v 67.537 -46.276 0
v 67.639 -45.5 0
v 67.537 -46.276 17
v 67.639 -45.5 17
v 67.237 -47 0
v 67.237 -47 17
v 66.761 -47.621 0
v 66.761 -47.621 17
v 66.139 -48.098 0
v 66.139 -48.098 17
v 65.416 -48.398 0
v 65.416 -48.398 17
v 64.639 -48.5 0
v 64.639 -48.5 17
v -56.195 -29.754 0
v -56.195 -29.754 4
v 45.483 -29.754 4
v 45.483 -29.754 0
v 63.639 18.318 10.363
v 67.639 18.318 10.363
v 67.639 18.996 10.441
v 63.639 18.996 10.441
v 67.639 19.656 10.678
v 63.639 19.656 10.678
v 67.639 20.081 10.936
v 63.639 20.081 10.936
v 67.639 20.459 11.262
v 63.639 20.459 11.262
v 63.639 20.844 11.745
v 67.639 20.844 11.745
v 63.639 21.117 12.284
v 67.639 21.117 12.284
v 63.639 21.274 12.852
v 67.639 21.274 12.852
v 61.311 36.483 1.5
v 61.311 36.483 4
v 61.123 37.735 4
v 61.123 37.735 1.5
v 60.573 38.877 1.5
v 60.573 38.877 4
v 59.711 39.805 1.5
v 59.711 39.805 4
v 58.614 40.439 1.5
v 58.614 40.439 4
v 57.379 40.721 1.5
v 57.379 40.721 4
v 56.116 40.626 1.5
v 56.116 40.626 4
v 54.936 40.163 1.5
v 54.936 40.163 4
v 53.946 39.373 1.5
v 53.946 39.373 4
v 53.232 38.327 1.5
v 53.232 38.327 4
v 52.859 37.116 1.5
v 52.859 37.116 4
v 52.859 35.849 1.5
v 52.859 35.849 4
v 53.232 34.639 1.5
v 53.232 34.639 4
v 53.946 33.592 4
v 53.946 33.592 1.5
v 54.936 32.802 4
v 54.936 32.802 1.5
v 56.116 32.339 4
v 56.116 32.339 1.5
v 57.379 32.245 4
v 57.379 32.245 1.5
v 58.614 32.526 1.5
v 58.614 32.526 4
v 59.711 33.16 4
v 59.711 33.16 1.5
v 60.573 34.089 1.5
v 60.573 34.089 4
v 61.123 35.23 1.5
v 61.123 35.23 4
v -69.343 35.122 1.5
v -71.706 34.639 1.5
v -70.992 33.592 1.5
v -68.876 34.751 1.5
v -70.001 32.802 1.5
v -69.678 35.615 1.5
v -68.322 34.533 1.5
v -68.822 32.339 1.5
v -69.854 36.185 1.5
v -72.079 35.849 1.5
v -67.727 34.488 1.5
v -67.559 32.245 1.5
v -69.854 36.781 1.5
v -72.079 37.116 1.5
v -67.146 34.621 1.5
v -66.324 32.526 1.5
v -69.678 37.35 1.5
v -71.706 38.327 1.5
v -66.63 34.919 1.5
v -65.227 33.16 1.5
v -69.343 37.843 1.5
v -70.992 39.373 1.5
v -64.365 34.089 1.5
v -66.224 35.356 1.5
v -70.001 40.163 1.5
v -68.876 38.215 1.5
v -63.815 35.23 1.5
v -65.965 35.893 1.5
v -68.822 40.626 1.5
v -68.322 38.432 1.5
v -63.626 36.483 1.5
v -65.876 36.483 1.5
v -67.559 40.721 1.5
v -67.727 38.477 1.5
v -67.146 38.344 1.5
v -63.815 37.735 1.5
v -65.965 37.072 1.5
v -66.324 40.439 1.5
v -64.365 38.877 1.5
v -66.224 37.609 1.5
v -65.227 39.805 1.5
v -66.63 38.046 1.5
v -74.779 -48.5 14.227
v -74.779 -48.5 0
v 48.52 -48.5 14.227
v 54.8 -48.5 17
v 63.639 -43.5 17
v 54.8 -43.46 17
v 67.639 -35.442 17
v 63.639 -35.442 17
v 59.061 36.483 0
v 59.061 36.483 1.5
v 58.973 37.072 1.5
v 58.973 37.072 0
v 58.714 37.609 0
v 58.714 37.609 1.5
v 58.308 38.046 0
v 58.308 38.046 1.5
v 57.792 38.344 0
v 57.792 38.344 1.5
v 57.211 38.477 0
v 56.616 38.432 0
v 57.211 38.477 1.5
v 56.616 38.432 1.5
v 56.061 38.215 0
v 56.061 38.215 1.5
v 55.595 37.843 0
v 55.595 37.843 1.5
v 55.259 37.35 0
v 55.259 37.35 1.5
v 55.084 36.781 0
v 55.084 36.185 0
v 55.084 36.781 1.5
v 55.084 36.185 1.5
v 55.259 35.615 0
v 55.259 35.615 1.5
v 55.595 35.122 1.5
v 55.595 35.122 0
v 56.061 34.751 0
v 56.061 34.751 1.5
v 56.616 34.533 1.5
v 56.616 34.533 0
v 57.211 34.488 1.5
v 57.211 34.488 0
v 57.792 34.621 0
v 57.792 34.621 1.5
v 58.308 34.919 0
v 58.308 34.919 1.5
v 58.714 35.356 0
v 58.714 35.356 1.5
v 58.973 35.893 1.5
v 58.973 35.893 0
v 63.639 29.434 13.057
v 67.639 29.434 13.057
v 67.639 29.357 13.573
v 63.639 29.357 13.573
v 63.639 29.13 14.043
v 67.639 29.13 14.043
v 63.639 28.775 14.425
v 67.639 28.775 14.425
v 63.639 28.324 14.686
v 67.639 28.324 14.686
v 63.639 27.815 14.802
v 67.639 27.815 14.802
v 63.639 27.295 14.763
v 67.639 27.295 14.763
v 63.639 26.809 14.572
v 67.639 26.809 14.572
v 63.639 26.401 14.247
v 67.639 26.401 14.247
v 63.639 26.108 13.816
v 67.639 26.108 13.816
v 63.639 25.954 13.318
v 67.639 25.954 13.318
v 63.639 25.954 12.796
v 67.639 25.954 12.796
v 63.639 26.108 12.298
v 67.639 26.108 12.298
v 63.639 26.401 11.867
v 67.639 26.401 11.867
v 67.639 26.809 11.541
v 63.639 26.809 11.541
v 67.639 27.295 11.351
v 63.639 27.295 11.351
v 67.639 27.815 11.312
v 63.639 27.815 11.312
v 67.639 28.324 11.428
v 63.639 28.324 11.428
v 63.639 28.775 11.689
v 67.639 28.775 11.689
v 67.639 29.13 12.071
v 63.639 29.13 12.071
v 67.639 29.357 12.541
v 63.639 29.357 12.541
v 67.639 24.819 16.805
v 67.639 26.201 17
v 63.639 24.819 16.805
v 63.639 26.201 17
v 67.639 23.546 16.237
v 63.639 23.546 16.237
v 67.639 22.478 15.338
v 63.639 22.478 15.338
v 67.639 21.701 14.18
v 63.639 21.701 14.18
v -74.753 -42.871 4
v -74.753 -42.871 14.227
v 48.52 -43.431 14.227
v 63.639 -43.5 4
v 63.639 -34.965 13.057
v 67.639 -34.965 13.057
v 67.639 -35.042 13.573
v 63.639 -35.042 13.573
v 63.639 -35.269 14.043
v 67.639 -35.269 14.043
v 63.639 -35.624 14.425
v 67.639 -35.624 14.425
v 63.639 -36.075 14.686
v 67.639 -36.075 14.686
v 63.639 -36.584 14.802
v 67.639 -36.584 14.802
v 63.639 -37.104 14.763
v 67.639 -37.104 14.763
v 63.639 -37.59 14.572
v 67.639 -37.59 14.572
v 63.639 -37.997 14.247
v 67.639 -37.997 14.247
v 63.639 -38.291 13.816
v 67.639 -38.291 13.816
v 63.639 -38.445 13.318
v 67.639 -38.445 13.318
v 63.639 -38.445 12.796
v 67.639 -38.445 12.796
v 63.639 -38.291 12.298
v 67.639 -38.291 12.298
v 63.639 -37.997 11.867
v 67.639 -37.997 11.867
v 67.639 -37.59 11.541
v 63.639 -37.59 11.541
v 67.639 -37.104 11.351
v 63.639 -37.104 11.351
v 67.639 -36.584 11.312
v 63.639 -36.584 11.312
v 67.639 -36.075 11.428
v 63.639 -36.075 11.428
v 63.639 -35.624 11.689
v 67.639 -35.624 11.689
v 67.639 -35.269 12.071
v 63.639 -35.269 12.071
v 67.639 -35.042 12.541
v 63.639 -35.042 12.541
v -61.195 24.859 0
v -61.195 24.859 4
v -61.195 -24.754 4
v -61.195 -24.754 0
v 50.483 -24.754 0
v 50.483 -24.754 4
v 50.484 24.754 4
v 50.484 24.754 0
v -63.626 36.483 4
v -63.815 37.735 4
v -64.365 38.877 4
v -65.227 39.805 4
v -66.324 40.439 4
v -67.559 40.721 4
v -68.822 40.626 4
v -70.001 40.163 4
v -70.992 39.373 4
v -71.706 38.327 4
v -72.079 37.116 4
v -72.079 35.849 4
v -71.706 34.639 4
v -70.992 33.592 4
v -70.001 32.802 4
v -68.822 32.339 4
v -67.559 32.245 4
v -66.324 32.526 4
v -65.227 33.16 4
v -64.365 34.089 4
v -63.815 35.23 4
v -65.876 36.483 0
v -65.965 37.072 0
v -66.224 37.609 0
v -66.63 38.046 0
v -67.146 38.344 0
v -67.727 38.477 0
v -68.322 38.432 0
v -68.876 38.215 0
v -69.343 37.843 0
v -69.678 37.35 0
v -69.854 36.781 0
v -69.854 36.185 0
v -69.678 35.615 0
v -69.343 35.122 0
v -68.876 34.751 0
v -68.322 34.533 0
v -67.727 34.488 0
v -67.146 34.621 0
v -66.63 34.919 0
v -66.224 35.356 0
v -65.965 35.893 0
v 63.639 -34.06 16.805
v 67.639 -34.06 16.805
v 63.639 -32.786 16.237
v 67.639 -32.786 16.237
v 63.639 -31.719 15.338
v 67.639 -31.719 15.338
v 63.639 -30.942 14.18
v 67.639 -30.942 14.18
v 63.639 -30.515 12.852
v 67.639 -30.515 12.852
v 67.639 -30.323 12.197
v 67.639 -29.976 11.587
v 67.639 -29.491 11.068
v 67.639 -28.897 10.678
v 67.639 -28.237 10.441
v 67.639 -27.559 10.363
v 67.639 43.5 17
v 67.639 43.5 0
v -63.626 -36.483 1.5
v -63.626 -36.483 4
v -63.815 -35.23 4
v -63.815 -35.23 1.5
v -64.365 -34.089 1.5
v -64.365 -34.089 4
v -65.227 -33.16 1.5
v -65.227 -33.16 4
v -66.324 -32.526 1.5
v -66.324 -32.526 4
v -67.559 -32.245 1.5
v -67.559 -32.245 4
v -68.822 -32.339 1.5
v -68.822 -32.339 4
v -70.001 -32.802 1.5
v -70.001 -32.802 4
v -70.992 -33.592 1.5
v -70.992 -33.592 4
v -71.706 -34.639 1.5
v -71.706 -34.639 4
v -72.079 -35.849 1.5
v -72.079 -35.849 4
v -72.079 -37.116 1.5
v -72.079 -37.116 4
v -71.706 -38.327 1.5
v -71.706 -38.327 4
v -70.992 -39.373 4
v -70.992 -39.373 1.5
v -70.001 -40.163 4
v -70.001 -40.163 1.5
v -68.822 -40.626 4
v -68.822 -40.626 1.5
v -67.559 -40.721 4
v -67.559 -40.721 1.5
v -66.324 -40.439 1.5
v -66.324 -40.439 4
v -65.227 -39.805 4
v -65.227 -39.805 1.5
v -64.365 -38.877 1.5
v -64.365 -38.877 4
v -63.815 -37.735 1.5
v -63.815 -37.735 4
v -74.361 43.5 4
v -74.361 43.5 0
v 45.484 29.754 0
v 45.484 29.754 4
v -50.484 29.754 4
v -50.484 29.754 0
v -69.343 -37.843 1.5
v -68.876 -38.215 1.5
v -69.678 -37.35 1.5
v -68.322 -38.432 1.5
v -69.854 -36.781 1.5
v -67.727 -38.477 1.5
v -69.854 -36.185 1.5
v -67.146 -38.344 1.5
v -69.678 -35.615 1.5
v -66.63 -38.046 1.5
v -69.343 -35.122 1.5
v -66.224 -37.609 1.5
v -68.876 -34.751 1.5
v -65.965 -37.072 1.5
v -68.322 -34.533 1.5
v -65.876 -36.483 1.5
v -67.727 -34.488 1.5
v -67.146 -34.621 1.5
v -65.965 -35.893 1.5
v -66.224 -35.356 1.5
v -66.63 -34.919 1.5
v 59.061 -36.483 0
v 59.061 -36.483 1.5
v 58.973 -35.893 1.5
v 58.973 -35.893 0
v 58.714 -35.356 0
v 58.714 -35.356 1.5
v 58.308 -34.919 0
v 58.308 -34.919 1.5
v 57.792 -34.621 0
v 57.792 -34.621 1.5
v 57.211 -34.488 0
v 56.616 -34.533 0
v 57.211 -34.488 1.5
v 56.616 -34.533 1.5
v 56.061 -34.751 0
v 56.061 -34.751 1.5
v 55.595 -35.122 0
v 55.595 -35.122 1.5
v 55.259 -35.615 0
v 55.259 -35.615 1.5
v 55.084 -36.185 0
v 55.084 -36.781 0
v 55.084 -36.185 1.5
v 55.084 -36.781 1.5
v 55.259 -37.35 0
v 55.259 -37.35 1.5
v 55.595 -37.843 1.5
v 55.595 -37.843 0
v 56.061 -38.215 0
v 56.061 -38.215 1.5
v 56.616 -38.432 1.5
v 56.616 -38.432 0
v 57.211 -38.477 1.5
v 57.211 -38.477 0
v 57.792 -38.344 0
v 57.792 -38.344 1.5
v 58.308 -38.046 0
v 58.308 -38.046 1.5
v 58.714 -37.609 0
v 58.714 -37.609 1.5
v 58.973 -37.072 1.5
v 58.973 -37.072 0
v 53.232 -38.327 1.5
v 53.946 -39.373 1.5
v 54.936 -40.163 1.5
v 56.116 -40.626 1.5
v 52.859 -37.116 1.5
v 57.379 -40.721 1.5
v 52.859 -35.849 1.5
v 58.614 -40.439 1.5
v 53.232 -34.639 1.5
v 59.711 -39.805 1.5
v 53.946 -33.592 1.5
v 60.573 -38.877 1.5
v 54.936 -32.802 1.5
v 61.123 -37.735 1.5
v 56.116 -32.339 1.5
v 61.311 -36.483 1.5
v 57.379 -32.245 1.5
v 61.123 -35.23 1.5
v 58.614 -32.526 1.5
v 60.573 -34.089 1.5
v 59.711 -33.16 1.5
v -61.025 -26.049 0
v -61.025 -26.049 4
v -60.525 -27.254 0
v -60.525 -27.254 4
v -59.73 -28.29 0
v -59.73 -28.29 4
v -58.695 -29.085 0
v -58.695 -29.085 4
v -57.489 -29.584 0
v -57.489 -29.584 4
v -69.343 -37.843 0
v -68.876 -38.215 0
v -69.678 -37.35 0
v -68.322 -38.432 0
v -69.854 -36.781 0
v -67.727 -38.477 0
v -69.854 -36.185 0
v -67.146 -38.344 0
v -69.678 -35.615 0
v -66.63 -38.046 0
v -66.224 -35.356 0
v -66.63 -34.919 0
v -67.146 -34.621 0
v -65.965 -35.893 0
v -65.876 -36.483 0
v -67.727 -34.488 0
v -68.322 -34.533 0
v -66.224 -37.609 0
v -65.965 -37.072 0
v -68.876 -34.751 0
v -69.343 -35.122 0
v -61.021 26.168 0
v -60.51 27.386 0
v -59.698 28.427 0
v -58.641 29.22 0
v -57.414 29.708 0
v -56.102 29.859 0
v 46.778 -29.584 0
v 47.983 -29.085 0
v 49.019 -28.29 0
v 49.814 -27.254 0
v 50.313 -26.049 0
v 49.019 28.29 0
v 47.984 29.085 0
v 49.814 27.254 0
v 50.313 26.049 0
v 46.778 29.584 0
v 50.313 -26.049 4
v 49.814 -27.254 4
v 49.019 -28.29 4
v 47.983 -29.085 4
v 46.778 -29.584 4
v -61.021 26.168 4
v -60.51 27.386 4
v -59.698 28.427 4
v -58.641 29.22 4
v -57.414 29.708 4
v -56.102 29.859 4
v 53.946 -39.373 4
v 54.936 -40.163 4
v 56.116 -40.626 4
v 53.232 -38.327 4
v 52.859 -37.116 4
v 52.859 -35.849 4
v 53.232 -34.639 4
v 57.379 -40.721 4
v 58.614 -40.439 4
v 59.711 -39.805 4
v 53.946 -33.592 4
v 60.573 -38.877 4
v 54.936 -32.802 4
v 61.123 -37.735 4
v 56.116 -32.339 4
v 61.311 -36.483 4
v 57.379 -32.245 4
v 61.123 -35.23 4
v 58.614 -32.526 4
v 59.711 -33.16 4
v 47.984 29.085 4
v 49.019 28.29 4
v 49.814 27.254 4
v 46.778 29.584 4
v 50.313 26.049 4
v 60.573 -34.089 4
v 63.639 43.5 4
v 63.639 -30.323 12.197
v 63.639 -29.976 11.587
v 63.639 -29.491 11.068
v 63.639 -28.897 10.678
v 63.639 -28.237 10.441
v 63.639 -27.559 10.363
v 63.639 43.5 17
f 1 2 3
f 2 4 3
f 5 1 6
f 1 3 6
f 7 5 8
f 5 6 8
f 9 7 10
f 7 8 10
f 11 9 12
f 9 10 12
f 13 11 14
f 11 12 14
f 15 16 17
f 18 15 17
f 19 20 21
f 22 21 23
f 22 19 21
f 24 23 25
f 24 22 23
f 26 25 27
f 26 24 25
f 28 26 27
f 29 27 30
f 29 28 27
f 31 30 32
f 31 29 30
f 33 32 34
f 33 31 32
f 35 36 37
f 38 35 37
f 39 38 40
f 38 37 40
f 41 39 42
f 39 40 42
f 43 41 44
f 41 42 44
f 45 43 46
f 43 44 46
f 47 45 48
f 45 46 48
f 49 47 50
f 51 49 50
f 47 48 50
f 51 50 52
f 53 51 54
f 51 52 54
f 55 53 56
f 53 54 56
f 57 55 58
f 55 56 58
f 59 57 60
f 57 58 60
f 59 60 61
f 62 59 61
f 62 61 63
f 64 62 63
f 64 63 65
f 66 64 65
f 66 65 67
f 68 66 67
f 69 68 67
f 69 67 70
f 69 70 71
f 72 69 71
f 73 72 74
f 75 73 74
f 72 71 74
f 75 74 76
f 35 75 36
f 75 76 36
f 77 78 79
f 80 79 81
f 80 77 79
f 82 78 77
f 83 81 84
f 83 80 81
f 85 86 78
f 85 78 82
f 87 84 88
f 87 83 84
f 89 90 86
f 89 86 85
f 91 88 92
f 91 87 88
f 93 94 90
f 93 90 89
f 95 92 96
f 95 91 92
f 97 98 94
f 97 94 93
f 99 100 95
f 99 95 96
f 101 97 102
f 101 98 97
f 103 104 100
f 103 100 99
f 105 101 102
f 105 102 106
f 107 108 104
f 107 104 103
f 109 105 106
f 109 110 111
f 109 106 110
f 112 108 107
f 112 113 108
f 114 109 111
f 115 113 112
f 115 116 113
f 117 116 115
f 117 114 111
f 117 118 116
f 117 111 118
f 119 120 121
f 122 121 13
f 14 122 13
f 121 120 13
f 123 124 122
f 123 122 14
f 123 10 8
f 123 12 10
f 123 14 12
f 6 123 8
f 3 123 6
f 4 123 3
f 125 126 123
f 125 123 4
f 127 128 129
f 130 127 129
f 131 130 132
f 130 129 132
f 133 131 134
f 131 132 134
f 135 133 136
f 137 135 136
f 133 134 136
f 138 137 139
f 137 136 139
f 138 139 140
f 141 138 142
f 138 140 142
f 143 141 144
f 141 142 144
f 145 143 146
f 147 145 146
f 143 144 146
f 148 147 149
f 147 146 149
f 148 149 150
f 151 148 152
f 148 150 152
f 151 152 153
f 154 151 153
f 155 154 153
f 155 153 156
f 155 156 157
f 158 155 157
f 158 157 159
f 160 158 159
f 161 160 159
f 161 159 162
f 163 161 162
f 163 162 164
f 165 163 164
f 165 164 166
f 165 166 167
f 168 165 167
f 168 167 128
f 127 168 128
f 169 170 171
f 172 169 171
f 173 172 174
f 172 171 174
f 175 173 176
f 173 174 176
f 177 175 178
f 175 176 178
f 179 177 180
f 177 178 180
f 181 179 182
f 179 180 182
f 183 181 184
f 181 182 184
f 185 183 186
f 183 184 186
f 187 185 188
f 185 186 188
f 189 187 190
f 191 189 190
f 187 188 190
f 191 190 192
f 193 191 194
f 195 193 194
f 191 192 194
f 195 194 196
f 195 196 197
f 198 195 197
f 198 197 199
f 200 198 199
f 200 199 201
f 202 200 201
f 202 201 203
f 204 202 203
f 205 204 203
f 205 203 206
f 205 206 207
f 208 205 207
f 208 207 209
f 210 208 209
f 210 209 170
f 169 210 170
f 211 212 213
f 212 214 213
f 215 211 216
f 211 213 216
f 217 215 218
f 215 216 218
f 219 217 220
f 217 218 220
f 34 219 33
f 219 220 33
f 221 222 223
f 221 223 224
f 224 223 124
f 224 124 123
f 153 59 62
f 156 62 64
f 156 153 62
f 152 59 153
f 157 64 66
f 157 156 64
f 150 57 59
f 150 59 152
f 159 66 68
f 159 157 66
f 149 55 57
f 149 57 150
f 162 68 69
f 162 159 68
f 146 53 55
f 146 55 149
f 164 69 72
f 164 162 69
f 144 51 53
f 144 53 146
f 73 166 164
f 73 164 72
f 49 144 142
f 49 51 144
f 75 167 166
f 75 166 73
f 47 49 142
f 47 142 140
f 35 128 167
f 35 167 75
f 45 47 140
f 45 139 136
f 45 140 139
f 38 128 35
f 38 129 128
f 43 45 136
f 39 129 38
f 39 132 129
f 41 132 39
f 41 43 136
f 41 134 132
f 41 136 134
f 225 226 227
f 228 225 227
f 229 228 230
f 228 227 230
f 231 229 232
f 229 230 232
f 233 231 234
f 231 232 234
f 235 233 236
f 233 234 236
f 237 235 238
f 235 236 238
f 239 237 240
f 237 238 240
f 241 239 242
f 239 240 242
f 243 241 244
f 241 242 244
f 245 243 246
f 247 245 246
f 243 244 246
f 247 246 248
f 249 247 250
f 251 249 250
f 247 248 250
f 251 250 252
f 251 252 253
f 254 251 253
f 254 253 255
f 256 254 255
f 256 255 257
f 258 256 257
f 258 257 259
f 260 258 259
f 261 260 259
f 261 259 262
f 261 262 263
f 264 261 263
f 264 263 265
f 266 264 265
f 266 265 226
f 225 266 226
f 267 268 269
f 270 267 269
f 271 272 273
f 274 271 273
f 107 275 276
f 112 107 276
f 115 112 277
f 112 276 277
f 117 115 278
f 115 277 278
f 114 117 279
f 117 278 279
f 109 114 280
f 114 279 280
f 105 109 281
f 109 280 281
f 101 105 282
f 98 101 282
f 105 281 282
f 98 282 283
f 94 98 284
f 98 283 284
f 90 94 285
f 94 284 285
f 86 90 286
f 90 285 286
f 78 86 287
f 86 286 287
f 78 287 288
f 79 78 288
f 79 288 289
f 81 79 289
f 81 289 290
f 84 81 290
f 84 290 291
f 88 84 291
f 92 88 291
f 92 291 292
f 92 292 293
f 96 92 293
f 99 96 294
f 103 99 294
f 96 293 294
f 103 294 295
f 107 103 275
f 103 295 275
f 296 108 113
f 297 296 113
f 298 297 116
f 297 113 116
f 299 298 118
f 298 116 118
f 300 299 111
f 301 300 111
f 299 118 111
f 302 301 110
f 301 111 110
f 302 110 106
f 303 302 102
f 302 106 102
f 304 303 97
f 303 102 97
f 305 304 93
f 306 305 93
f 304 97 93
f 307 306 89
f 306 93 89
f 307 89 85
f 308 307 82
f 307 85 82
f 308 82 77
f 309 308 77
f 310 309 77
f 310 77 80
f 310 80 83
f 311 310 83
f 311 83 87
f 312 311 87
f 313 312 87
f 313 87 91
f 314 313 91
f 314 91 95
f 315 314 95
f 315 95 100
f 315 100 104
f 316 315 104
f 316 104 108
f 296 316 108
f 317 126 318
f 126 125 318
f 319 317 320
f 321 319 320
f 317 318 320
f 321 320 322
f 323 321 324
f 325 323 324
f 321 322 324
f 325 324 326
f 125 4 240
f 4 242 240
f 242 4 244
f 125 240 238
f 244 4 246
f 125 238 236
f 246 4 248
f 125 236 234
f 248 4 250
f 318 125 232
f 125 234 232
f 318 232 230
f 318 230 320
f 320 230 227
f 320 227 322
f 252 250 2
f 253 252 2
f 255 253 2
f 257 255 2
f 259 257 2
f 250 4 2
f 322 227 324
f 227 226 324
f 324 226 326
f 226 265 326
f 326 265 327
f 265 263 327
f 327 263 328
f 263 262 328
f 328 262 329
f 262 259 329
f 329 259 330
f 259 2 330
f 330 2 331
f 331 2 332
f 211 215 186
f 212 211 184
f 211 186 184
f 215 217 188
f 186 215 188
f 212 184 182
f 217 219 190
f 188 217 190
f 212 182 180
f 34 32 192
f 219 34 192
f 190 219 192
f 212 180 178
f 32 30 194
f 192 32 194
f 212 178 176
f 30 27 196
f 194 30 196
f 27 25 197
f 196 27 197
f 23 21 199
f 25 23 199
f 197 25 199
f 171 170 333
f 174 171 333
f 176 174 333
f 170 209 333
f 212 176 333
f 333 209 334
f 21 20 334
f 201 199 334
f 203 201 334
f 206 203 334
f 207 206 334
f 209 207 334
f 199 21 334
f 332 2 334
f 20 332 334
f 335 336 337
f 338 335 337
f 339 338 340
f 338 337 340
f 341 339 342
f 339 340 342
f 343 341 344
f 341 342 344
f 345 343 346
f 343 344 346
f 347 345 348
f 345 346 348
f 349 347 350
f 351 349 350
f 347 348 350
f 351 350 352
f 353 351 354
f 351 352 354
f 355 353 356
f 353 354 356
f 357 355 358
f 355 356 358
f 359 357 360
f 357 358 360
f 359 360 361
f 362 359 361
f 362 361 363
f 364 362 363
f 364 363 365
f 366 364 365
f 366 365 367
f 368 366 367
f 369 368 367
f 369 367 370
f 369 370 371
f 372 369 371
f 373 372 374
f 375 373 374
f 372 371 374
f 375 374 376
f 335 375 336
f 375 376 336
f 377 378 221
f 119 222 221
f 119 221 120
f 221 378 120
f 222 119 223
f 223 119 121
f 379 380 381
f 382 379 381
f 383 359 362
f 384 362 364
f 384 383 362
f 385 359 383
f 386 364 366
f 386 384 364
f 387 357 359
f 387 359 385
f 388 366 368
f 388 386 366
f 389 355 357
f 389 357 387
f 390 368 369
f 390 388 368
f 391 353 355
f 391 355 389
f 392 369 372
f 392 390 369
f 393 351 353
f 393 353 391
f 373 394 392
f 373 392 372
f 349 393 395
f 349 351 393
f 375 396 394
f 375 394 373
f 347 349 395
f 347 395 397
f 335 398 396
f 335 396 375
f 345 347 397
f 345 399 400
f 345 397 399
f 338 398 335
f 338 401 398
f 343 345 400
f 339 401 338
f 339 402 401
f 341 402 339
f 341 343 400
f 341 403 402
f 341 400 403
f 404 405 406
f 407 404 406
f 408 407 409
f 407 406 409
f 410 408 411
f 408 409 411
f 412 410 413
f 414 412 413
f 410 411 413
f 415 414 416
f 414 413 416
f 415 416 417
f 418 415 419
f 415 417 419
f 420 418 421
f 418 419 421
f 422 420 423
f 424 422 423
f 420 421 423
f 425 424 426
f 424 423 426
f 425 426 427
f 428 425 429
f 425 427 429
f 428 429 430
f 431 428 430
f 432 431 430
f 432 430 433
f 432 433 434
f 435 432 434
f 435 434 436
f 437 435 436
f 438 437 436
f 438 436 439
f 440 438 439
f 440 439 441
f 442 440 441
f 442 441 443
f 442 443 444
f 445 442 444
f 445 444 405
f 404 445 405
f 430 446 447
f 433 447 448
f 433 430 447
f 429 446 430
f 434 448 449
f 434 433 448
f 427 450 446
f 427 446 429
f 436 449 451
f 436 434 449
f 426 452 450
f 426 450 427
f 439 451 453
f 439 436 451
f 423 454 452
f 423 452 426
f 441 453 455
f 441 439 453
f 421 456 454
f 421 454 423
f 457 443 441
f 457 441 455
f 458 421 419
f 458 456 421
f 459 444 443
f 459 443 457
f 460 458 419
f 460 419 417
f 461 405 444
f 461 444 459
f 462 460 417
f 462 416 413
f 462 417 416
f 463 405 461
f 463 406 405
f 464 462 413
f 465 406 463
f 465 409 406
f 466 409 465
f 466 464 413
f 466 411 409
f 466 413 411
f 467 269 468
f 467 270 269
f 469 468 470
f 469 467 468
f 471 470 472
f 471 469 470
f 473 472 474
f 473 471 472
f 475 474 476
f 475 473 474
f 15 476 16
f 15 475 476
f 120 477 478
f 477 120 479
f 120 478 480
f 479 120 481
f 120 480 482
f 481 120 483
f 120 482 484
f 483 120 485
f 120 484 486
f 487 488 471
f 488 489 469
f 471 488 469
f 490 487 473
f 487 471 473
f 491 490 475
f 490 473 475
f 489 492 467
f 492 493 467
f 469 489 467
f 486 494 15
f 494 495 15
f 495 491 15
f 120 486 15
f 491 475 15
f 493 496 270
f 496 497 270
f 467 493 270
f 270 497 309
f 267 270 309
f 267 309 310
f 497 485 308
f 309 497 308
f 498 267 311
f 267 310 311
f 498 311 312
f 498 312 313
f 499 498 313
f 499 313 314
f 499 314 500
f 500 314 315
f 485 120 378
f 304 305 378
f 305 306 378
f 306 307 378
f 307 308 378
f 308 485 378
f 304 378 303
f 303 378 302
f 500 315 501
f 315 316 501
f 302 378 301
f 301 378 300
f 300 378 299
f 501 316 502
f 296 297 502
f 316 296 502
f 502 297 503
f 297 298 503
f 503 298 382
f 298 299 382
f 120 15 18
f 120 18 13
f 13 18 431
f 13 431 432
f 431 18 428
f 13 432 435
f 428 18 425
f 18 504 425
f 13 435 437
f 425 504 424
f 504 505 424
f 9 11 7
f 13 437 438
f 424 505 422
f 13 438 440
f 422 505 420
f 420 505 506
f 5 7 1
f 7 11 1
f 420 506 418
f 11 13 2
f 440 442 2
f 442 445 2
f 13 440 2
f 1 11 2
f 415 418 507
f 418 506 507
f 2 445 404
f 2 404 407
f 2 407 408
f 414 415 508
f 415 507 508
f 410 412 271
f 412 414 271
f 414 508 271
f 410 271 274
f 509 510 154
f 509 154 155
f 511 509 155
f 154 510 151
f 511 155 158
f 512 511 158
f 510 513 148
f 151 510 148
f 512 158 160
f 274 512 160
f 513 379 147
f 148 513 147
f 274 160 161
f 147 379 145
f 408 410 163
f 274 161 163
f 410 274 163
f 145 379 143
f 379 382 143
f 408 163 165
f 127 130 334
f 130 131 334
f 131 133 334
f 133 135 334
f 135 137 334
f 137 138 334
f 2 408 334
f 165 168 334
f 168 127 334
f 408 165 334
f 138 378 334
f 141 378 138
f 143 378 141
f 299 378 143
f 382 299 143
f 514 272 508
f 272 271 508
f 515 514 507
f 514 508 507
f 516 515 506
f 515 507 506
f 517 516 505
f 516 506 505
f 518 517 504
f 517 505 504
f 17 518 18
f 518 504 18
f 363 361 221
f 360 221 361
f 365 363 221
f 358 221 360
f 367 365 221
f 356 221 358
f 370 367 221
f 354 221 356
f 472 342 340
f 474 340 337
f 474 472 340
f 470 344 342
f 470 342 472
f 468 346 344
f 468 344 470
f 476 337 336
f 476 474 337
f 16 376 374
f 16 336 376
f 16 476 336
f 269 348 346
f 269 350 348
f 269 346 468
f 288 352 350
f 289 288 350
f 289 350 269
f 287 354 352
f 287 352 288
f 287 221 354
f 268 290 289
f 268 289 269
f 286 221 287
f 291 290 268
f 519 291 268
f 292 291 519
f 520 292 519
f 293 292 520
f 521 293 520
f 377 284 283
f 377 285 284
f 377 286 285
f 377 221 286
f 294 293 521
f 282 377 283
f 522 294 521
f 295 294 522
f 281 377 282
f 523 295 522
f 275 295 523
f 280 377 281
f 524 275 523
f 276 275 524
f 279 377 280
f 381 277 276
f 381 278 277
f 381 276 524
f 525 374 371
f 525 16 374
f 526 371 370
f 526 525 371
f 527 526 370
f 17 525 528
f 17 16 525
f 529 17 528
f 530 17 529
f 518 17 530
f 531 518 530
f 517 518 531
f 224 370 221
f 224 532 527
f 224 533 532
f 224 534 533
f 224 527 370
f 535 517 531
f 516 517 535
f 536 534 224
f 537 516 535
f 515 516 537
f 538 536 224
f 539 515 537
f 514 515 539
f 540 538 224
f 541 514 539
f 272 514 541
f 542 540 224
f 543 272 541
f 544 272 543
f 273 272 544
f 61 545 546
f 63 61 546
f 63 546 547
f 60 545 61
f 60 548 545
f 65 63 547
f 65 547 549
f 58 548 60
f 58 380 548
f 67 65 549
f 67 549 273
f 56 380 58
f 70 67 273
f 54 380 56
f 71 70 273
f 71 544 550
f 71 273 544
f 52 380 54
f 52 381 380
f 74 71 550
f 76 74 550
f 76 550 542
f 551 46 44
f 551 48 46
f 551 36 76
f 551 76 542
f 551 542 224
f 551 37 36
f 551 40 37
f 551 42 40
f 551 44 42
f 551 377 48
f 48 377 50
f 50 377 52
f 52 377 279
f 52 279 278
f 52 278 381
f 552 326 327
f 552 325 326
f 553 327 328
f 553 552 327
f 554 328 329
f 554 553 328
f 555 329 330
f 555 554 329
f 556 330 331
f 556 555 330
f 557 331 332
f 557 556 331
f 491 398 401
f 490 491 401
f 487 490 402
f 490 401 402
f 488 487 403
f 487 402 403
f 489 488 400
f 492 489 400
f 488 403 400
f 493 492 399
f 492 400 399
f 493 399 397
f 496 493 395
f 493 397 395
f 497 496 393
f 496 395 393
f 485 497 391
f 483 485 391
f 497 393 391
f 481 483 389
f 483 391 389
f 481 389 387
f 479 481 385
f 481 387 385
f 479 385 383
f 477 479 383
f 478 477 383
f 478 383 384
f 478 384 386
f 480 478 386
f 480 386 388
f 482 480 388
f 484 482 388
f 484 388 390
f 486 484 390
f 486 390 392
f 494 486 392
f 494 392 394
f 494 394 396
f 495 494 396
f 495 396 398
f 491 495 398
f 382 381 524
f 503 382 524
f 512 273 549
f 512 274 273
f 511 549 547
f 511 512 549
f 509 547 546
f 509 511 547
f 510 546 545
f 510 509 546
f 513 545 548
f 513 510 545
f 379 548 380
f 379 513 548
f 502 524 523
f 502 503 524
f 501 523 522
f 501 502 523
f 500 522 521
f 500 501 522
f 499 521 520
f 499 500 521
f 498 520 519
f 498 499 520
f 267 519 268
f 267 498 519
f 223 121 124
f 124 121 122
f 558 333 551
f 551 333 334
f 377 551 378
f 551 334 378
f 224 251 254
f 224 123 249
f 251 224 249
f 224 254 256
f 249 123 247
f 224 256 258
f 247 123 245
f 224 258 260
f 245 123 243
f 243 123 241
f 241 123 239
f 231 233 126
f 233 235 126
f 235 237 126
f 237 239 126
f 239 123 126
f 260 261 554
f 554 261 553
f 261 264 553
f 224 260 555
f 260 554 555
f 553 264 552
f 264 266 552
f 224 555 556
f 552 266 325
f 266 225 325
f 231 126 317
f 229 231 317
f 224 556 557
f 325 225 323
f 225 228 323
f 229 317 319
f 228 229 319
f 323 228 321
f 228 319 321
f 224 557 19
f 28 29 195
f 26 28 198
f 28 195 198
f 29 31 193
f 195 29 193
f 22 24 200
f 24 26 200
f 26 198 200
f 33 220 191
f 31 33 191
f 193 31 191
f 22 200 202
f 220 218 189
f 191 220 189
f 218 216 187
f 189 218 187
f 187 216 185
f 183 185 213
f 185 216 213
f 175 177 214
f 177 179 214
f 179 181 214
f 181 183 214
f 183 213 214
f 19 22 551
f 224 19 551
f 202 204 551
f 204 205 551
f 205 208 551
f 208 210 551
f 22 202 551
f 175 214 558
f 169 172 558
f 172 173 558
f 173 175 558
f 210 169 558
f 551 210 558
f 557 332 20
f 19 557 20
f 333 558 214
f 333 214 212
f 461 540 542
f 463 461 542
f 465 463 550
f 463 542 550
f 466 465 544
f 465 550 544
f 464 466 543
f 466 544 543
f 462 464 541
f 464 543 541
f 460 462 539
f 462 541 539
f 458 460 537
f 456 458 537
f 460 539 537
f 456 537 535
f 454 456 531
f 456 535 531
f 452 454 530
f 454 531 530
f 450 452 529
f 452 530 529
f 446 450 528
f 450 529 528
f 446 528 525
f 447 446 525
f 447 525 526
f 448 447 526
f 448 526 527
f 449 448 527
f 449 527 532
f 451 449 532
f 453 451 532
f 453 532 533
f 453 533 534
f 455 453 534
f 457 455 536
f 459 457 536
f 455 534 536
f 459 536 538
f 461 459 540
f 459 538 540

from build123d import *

# Parameters (mm, degrees)
F1_DEPTH  = 17
F3_DEPTH  = 13
F5_R      = 1.75
F6_DEPTH  = 7
F8_DEPTH  = 25
F9_R      = 3
F10_R     = 5
F11_R     = 2
F12_DEPTH = 25
F13_R     = 4.25
F14_DEPTH = 2.5
F16_DEPTH = 25
F17_R     = 5
F18_R     = 3


# Not quite as in the source:
# - ends of sketch curves that miss each other by under 0.0002 mm in the source are joined
# - a feature names something its author has since deleted; it is built from what else it names


with BuildPart() as f1:
    # F0 (on Top) → F1 (new body)
    with BuildSketch(Plane.XY):
        Polygon((67.6393576576, 43.5), (-74.3606423424, 43.5), (-74.7787490059, -48.5), (67.6393576576, -48.5), align=None)
    extrude(amount=F1_DEPTH)

    # F2 (on face) → F3 (cut)
    with BuildSketch(Plane.XY.offset(17)):
        Polygon((63.6393576576, 43.5), (-74.3606423424, 43.5), (-74.7531674957, -42.8710561201), (63.6393576576, -43.5), align=None)
    extrude(amount=-F3_DEPTH, mode=Mode.SUBTRACT)

    # F5 (on face) → F6 (cut)
    with BuildSketch(Plane.YZ.offset(67.6393576576)):
        with Locations((27.6843051805, 13.0568410139)):
            Circle(F5_R)
        with Locations((-36.7146101537, 13.0568410233)):
            Circle(F5_R)
        with BuildLine():
            ThreePointArc((27.6607478596, 17.0567716449), (27.6840839728, 17.0568410078), (27.7074200936, 17.0567742259))
            Line((27.7074200936, 17.0567742259), (47.12958325, 17.057848309))
            Line((47.12958325, 17.057848309), (47.1295543691, 17.7527777587))
            Line((47.1295543691, 17.7527777587), (48.6345604738, 26.1808149253))
            Line((48.6345604738, 26.1808149253), (32.3804893276, 26.9834864621))
            Line((32.3804893276, 26.9834864621), (-57.0169261912, 27.2844880555))
            Line((-57.0169261912, 27.2844880555), (-57.1818195967, 17.0567789567))
            Line((-57.1818195967, 17.0567789567), (-36.7146222837, 17.0568410232))
            Line((-36.7146222837, 17.0568410232), (-30.4415900066, 17.0568410232))
            Line((-30.4415900066, 17.0568410232), (-30.4415900066, 10.3634270296))
            Line((-30.4415900066, 10.3634270296), (21.2007000848, 10.3634270296))
            Line((21.2007000848, 10.3634270296), (21.2007000848, 17.0567742259))
            Line((21.2007000848, 17.0567742259), (27.6607478596, 17.0567716449))
        make_face()
    extrude(amount=-F6_DEPTH, mode=Mode.SUBTRACT)

    # F7 (on face) → F8 (cut)
    with BuildSketch(Plane.XY.offset(4)):
        Polygon((-50.4835, -29.7545), (50.4835, -29.7545), (50.4835, 29.7545), (-50.4835, 29.7545), (-61.1949004233, 29.9527719617), (-61.1949004233, -29.7545), align=None)
    extrude(amount=-F8_DEPTH, mode=Mode.SUBTRACT)

    # F9
    f9_edges = [f1.edges().sort_by_distance(p)[0] for p in [
        (67.639358, -48.5, 8.5),
    ]]
    fillet(f9_edges, radius=F9_R)

    # F10
    f10_edges = [f1.edges().sort_by_distance(p)[0] for p in [
        (50.4835, 29.7545, 2),
        (-61.1949, 29.952772, 2),
        (50.4835, -29.7545, 2),
        (-61.1949, -29.7545, 2),
    ]]
    fillet(f10_edges, radius=F10_R)

    # F11 (on face) → F12 (cut)
    with BuildSketch(Plane.XY.offset(4)):
        with Locations((-67.8764981099, -36.4826410897)):
            Circle(F11_R)
        with Locations((57.0614288288, -36.4826410897)):
            Circle(F11_R)
        with Locations((-67.8764981099, 36.4826410897)):
            Circle(F11_R)
        with Locations((57.0614288288, 36.4826410897)):
            Circle(F11_R)
    extrude(amount=-F12_DEPTH, mode=Mode.SUBTRACT)

    # F13 (on face) → F14 (cut)
    with BuildSketch(Plane.XY.offset(4)):
        with Locations((-67.8764981099, 36.4826410897)):
            Circle(F13_R)
        with Locations((57.0614288288, 36.4826410897)):
            Circle(F13_R)
        with Locations((-67.8764981099, -36.4826410897)):
            Circle(F13_R)
        with Locations((57.0614288288, -36.4826410897)):
            Circle(F13_R)
    extrude(amount=-F14_DEPTH, mode=Mode.SUBTRACT)

    # F15 (on face) → F16 (cut)
    with BuildSketch(Plane.XZ.offset(48.5)):
        Polygon((-78.4085690975, 22.2279634327), (-78.4085690975, 14.2272571102), (48.5201984959, 14.2272571102), (54.7997877002, 17), (47.9935184121, 22.2279634327), align=None)
    extrude(amount=-F16_DEPTH, mode=Mode.SUBTRACT)

    # F17
    f17_edges = [f1.edges().sort_by_distance(p)[0] for p in [
        (65.639358, -30.44159, 17),
        (65.639358, 21.2007, 17),
    ]]
    fillet(f17_edges, radius=F17_R)

    # F18
    f18_edges = [f1.edges().sort_by_distance(p)[0] for p in [
        (65.639358, -30.44159, 10.363427),
        (65.639358, 21.2007, 10.363427),
    ]]
    fillet(f18_edges, radius=F18_R)


solid = f1.part
